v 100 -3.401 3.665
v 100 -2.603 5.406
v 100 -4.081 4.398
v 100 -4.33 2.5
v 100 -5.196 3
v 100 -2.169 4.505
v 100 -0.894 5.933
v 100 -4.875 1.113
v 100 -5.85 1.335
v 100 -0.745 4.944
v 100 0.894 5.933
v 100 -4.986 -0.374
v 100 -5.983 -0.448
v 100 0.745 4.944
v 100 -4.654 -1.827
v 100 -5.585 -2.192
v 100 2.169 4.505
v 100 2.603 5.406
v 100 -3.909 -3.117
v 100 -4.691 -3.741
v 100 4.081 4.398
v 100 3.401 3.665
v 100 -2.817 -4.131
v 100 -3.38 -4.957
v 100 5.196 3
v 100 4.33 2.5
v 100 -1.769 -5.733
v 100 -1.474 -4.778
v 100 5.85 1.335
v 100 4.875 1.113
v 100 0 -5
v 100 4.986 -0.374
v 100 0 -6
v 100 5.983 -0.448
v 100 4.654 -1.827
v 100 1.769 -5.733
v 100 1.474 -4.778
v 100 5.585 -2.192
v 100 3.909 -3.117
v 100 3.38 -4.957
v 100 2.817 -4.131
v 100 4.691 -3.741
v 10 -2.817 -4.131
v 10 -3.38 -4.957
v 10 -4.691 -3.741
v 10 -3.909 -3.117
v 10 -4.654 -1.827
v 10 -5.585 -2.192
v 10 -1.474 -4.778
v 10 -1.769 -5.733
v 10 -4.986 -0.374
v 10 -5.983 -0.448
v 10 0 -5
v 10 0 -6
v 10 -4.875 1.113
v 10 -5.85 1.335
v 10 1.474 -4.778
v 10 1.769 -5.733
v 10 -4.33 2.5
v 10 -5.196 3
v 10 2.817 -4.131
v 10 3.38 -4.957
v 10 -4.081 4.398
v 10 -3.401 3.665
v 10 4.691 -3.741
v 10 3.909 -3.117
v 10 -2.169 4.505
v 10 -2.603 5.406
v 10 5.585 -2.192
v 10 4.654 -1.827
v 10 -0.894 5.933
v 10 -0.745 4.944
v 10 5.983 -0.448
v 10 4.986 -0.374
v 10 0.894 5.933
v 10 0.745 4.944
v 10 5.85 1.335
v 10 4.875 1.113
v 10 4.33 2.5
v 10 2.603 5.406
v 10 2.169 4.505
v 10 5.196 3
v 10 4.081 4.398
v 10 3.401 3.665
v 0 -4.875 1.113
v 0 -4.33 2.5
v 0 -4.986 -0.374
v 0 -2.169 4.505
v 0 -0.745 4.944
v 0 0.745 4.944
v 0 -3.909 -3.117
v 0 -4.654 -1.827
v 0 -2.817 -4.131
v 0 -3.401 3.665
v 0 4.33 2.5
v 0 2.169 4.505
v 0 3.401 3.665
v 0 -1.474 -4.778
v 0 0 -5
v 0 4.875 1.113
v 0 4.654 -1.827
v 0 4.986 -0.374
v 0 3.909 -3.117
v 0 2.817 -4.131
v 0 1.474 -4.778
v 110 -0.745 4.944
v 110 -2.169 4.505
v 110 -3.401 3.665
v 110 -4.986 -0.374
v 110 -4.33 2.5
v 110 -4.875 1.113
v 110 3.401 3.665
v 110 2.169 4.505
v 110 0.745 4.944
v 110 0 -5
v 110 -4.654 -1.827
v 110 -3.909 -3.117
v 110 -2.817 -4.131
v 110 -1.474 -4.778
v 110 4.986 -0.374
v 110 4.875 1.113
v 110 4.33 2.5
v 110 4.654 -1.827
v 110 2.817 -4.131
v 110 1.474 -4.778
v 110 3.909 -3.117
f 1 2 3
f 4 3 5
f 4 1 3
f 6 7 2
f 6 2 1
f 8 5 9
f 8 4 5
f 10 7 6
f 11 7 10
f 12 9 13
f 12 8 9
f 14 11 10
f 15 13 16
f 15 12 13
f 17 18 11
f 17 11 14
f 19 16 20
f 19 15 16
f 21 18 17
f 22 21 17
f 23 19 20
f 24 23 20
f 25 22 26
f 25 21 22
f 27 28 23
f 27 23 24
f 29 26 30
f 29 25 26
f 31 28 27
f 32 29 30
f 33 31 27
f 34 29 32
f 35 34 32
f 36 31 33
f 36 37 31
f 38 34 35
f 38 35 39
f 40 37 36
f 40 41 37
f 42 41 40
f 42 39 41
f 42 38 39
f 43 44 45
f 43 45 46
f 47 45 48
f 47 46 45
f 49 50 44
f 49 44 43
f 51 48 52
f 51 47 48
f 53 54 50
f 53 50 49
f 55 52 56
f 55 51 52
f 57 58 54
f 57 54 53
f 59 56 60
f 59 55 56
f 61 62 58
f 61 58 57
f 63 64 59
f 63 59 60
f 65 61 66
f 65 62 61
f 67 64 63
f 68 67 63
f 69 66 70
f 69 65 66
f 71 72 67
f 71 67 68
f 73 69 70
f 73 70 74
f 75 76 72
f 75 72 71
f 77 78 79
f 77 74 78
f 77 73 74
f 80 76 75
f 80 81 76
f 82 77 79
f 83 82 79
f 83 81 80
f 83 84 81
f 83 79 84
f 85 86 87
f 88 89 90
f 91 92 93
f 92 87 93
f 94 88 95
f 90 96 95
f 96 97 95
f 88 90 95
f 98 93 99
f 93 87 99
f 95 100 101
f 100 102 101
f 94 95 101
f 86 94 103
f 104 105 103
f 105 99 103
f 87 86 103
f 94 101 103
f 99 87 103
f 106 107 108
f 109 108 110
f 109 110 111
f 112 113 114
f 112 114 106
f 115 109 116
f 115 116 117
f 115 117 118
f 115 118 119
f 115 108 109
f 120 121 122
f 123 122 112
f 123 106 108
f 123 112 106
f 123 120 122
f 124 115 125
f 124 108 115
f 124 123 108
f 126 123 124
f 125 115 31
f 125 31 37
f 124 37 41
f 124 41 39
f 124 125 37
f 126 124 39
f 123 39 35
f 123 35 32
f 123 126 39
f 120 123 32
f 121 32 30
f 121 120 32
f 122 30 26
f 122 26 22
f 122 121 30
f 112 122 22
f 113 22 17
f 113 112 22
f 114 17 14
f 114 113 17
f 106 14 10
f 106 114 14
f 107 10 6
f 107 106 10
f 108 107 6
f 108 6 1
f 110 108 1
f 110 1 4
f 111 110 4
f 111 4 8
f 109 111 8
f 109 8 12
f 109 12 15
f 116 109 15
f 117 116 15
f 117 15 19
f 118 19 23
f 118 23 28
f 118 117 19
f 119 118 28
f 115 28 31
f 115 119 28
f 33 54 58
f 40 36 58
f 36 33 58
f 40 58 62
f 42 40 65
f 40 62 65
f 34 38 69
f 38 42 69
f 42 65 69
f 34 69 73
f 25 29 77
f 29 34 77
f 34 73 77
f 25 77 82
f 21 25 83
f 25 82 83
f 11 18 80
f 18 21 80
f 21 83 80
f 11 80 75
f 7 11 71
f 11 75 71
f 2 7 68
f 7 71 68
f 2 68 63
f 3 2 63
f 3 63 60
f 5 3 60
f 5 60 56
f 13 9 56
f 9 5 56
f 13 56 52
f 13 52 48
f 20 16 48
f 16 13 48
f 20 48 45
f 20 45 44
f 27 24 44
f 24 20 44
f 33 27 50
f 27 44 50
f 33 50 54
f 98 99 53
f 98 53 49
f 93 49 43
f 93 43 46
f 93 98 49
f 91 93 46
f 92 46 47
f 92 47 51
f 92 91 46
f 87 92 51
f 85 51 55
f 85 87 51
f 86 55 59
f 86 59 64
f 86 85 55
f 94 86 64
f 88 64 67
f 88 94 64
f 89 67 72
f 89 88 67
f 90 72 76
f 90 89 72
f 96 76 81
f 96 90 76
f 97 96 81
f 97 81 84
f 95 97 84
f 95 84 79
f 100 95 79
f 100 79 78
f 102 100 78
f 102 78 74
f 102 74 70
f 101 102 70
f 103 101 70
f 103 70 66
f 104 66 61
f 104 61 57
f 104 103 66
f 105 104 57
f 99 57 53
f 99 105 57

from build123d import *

# Parameters (mm, degrees)
SKETCH1_R           = 6
BOSS_EXTRUDE1_DEPTH = 110
SKETCH2_OUTSIDE_W   = 36.26
SKETCH2_OUTSIDE_H   = 36.26
SKETCH2_OUTSIDE_R   = 5
CUT_EXTRUDE1_DEPTH  = 10
SKETCH3_OUTSIDE_W   = 36.26
SKETCH3_OUTSIDE_H   = 36.26
SKETCH3_OUTSIDE_R   = 5
CUT_EXTRUDE2_DEPTH  = 10


with BuildPart() as part:
    # Sketch1 → Boss-Extrude1 (new body)
    with BuildSketch(Plane(origin=(0, 0, 0), x_dir=(0, 0, -1), z_dir=(1, 0, 0))):
        Circle(SKETCH1_R)
    extrude(amount=BOSS_EXTRUDE1_DEPTH)

    # Sketch2 outside → Cut-Extrude1 (cut)
    with BuildSketch(Plane(origin=(110, 0, 0), x_dir=(0, 0, -1), z_dir=(1, 0, 0))):
        Rectangle(SKETCH2_OUTSIDE_W, SKETCH2_OUTSIDE_H)
        Circle(SKETCH2_OUTSIDE_R, mode=Mode.SUBTRACT)
    extrude(amount=-CUT_EXTRUDE1_DEPTH, mode=Mode.SUBTRACT)

    # Sketch3 outside → Cut-Extrude2 (cut)
    with BuildSketch(Plane.ZY):
        Rectangle(SKETCH3_OUTSIDE_W, SKETCH3_OUTSIDE_H)
        with Locations(Location((0, 0, 0), (0, 0, 180))):
            Circle(SKETCH3_OUTSIDE_R, mode=Mode.SUBTRACT)
    extrude(amount=-CUT_EXTRUDE2_DEPTH, mode=Mode.SUBTRACT)


solid = part.part
